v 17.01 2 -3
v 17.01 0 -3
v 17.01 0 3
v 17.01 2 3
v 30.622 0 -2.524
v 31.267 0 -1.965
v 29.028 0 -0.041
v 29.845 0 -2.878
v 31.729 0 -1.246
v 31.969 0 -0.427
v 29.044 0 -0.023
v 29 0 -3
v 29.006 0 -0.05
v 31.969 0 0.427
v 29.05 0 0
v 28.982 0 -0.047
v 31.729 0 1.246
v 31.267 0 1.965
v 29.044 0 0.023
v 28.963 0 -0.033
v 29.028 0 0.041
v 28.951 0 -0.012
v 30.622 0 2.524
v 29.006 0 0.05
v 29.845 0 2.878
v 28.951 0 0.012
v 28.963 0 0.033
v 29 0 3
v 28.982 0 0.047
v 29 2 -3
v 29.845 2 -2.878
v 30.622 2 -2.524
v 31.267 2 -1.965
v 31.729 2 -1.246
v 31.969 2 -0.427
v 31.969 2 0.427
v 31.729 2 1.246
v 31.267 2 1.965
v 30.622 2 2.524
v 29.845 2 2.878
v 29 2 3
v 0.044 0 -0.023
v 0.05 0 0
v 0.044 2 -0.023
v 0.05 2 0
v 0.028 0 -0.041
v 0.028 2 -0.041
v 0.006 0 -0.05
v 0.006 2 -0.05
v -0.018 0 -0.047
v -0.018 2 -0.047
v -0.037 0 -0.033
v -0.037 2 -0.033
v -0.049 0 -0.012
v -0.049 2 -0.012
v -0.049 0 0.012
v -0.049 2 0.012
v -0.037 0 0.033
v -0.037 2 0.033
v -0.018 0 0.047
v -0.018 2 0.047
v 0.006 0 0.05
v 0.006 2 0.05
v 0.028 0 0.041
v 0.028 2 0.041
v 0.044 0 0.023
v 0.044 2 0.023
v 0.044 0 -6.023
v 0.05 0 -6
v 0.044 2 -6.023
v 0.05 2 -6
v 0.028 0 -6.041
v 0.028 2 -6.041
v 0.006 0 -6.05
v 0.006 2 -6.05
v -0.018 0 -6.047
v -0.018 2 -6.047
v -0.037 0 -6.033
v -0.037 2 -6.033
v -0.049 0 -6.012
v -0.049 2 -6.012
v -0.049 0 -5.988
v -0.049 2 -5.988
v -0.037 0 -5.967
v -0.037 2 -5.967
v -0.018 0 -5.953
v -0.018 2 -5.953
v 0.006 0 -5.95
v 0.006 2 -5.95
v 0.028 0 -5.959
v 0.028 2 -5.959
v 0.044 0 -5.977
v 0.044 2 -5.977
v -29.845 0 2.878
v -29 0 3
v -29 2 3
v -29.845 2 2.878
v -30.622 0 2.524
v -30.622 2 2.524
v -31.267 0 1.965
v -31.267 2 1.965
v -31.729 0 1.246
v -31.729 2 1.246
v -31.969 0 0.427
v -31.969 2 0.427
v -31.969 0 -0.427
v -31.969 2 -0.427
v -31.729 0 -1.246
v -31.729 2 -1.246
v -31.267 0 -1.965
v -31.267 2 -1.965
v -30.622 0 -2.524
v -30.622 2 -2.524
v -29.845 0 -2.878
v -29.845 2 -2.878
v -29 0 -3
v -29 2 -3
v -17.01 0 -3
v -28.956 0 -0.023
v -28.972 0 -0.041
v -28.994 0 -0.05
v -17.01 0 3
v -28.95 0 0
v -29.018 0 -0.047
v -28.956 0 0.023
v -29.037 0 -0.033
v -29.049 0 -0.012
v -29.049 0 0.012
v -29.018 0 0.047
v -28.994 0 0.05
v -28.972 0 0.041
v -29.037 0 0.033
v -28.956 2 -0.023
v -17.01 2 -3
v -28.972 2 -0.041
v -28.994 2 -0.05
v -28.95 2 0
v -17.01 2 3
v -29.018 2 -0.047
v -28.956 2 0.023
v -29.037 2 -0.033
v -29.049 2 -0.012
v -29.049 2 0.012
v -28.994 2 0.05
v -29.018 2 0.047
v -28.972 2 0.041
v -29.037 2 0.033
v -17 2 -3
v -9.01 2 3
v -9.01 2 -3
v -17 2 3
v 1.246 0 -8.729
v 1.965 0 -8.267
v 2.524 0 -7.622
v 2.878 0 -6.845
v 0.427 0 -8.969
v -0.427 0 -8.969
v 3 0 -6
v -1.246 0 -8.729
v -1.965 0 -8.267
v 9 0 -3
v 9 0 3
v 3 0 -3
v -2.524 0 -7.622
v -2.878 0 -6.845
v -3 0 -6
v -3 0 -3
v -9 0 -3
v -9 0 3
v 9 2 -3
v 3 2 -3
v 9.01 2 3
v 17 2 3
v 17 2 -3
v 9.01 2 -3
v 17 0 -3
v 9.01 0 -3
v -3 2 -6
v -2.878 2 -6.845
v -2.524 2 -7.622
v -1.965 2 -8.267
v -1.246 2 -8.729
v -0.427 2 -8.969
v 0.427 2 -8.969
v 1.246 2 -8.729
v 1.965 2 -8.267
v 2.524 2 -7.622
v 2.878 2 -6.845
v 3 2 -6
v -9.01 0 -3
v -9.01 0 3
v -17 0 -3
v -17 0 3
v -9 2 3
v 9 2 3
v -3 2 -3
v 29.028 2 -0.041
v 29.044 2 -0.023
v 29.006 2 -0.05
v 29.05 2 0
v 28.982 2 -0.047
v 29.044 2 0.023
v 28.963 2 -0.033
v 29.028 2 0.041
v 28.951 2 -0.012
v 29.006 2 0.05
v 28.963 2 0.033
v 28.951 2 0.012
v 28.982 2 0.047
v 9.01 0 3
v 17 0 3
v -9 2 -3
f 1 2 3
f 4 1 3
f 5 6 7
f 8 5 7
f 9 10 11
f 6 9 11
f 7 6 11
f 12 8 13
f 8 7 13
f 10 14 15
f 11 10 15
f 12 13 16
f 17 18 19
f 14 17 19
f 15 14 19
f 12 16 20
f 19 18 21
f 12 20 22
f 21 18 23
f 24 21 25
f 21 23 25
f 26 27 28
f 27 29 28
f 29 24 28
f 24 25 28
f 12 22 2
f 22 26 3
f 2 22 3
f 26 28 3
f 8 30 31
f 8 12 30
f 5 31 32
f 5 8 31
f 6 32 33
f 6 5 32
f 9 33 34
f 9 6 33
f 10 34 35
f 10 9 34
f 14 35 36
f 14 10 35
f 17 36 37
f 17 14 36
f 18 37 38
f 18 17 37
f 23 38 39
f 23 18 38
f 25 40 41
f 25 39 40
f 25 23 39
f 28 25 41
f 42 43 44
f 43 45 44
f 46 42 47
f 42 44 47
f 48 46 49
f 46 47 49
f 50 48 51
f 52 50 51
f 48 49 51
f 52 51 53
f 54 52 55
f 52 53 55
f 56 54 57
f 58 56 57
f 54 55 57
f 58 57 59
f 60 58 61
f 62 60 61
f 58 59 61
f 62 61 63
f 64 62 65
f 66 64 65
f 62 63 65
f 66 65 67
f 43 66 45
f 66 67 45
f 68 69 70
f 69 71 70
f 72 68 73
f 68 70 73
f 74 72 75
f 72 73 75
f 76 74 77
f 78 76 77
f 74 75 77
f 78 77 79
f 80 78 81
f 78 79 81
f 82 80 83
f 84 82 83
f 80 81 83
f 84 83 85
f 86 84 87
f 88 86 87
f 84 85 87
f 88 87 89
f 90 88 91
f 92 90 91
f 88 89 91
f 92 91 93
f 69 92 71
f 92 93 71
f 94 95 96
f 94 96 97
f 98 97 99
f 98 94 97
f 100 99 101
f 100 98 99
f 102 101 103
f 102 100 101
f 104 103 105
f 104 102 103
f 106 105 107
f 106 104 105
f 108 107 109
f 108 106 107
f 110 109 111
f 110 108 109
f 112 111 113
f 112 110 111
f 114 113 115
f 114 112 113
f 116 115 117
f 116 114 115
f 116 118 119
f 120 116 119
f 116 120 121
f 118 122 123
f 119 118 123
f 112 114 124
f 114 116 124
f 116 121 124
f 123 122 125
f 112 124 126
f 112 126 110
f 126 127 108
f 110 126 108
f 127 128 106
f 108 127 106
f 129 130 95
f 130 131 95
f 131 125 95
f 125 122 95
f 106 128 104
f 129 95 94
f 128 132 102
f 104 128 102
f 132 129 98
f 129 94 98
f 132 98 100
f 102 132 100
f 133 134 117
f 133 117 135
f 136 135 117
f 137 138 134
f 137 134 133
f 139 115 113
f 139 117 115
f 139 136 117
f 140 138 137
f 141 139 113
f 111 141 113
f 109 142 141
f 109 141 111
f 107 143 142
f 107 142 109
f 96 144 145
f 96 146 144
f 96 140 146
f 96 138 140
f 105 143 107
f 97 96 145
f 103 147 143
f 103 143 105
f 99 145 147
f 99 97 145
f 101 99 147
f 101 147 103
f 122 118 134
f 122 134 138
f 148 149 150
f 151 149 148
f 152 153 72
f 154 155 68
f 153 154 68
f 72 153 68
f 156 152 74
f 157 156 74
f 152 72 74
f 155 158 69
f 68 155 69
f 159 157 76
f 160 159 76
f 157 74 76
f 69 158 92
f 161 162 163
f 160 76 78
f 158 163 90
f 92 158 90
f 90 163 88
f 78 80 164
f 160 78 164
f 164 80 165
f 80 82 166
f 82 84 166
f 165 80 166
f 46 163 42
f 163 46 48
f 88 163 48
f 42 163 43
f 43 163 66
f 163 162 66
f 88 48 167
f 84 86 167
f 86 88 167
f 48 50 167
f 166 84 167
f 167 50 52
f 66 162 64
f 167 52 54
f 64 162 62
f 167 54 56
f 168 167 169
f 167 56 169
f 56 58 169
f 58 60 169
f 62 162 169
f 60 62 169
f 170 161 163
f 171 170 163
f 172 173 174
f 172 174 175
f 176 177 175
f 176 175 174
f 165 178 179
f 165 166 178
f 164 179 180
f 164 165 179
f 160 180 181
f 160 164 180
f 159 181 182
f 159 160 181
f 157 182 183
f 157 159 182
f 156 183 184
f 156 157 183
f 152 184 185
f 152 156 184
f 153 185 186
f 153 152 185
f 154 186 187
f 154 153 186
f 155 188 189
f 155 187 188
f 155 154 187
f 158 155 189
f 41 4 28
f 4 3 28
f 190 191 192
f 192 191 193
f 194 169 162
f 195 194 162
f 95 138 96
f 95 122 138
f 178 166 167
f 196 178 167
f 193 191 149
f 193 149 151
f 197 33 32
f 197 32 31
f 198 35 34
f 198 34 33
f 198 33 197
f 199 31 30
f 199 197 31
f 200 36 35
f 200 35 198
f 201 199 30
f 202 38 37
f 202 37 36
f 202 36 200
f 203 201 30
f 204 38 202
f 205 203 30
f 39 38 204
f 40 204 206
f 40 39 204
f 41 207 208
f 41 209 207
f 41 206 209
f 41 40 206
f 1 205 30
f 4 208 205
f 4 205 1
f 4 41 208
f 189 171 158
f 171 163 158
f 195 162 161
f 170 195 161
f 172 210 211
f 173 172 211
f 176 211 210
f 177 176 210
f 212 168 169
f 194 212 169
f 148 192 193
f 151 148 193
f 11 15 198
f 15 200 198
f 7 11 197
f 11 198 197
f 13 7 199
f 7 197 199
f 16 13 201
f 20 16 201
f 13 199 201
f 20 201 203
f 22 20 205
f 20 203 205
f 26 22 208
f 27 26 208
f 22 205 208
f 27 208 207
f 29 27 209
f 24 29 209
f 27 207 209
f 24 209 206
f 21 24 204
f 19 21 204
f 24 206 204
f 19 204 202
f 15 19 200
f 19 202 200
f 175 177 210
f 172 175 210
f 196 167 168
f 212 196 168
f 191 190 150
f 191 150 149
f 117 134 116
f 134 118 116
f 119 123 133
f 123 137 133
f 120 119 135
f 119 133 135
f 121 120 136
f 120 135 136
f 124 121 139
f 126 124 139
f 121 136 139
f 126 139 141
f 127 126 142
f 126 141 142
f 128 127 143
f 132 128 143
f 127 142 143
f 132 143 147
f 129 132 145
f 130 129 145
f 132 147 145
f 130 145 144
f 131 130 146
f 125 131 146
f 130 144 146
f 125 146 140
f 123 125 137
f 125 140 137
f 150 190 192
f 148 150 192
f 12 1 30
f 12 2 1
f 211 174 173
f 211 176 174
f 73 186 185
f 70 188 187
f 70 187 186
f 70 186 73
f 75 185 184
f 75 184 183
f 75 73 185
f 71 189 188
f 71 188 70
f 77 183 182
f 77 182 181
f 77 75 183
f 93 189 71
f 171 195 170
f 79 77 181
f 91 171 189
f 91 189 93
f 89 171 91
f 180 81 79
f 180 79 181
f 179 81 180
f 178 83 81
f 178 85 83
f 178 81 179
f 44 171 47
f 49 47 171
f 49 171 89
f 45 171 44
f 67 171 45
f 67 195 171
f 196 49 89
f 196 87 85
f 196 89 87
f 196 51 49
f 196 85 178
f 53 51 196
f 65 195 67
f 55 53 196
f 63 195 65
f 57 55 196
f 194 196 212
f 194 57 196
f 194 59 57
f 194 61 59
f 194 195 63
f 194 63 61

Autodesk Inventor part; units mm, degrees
ref_plane "YZ Plane" through (0, 0, 0) normal (1, 0, 0) x (0, 1, 0)
ref_plane "XZ Plane" through (0, 0, 0) normal (0, 1, 0) x (-1, 0, 0)
ref_plane "XY Plane" through (0, 0, 0) normal (0, 0, 1) x (1, 0, 0)
sketch "Sketch1" plane through (0, 0, 0) normal (0, 1, 0) x (-1, 0, 0)
  line L0 (-9, -3) -> (9, -3)
  line L1 (9, -3) -> (9, 3)
  line L2 (9, 3) -> (-9, 3)
  line L3 (-9, 3) -> (-9, -3)
  line L4 (-9, -3) -> (9, 3) construction
  line L5 (9, -3) -> (-9, 3) construction
  line L6 (17, -3) -> (17, 3)
  line L7 (9, 3) -> (9, -3)
  line L8 (29, -3) -> (29, 3)
  line L9 (17, 3) -> (17, -3)
  line L10 (-17, -3) -> (-17, 3)
  line L11 (-9, 3) -> (-9, -3)
  line L12 (-29, -3) -> (-29, 3)
  line L13 (-17, 3) -> (-17, -3)
  circle A0 centre (29, 0) radius 3
  circle A1 centre (-29, 0) radius 3
  line L14 (9.01, -3) -> (9.01, 3)
  line L15 (9, 3) -> (9, -3)
  line L16 (9.01, -3) -> (17, -3)
  line L17 (9.01, 3) -> (17, 3)
  line L18 (17.01, -3) -> (17.01, 3)
  line L19 (17, 3) -> (17, -3)
  line L20 (17.01, -3) -> (29, -3)
  line L21 (17.01, 3) -> (29, 3)
  line L22 (-9.01, -3) -> (-9.01, 3)
  line L23 (-9, 3) -> (-9, -3)
  line L24 (-9.01, -3) -> (-17, -3)
  line L25 (-9.01, 3) -> (-17, 3)
  line L26 (-17.01, -3) -> (-17.01, 3)
  line L27 (-17, 3) -> (-17, -3)
  line L28 (-17.01, 3) -> (-29, 3)
  line L29 (-17.01, -3) -> (-29, -3)
  line L30 (0, -3) -> (0, -6)
  circle A2 centre (0, -6) radius 3
  line L31 (-3, -6) -> (3, -6)
  line L32 (3, -6) -> (3, -3)
  line L33 (3, -3) -> (-3, -3)
  line L34 (-3, -3) -> (-3, -6)
  line L35 (-3, -6) -> (3, -3) construction
  line L36 (3, -6) -> (-3, -3) construction
  point P0 (0, 0)
  point P1 (0, -4.5)
  dimension "d17" = 18
  dimension "d18" = 6
  dimension "d19" = 8
  dimension "d20" = 12
  dimension "d21" = 8
  dimension "d22" = 12
  dimension "d23" = 0.01
  dimension "d24" = 0.01
  dimension "d25" = 0.01
  dimension "d26" = 0.01
  dimension "d27" = 3
extrude "Extrusion1" add sketch "Sketch1" along normal blind 2
sketch "Sketch2" plane through (0, 2, 0) normal (0, 1, 0) x (1, 0, 0)
  arc A0 (3, 6) -> (-3, 6) centre (0, 6) ccw projected
  circle A1 centre (0, 6) radius 0.05
  circle A2 centre (0, 0) radius 0.05
  dimension "d30" = 0.1
  dimension "d31" = 0.1
extrude "Extrusion2" cut sketch "Sketch2" against normal blind 2
sketch "Sketch3" plane through (0, 2, 0) normal (0, 1, 0) x (1, 0, 0)
  arc A0 (-29, 3) -> (-29, -3) centre (-29, 0) ccw projected
  circle A1 centre (-29, 0) radius 0.05
  point P0 (0, 0)
  dimension "d34" = 0.1
extrude "Extrusion3" cut sketch "Sketch3" against normal blind 2
sketch "Sketch4" plane through (0, 2, 0) normal (0, 1, 0) x (1, 0, 0)
  arc A0 (29, -3) -> (29, 3) centre (29, 0) ccw projected
  circle A1 centre (29, 0) radius 0.05
  point P0 (0, 0)
  dimension "d37" = 0.1
extrude "Extrusion4" cut sketch "Sketch4" against normal blind 2
properties part number "tahlo6_sablona"
